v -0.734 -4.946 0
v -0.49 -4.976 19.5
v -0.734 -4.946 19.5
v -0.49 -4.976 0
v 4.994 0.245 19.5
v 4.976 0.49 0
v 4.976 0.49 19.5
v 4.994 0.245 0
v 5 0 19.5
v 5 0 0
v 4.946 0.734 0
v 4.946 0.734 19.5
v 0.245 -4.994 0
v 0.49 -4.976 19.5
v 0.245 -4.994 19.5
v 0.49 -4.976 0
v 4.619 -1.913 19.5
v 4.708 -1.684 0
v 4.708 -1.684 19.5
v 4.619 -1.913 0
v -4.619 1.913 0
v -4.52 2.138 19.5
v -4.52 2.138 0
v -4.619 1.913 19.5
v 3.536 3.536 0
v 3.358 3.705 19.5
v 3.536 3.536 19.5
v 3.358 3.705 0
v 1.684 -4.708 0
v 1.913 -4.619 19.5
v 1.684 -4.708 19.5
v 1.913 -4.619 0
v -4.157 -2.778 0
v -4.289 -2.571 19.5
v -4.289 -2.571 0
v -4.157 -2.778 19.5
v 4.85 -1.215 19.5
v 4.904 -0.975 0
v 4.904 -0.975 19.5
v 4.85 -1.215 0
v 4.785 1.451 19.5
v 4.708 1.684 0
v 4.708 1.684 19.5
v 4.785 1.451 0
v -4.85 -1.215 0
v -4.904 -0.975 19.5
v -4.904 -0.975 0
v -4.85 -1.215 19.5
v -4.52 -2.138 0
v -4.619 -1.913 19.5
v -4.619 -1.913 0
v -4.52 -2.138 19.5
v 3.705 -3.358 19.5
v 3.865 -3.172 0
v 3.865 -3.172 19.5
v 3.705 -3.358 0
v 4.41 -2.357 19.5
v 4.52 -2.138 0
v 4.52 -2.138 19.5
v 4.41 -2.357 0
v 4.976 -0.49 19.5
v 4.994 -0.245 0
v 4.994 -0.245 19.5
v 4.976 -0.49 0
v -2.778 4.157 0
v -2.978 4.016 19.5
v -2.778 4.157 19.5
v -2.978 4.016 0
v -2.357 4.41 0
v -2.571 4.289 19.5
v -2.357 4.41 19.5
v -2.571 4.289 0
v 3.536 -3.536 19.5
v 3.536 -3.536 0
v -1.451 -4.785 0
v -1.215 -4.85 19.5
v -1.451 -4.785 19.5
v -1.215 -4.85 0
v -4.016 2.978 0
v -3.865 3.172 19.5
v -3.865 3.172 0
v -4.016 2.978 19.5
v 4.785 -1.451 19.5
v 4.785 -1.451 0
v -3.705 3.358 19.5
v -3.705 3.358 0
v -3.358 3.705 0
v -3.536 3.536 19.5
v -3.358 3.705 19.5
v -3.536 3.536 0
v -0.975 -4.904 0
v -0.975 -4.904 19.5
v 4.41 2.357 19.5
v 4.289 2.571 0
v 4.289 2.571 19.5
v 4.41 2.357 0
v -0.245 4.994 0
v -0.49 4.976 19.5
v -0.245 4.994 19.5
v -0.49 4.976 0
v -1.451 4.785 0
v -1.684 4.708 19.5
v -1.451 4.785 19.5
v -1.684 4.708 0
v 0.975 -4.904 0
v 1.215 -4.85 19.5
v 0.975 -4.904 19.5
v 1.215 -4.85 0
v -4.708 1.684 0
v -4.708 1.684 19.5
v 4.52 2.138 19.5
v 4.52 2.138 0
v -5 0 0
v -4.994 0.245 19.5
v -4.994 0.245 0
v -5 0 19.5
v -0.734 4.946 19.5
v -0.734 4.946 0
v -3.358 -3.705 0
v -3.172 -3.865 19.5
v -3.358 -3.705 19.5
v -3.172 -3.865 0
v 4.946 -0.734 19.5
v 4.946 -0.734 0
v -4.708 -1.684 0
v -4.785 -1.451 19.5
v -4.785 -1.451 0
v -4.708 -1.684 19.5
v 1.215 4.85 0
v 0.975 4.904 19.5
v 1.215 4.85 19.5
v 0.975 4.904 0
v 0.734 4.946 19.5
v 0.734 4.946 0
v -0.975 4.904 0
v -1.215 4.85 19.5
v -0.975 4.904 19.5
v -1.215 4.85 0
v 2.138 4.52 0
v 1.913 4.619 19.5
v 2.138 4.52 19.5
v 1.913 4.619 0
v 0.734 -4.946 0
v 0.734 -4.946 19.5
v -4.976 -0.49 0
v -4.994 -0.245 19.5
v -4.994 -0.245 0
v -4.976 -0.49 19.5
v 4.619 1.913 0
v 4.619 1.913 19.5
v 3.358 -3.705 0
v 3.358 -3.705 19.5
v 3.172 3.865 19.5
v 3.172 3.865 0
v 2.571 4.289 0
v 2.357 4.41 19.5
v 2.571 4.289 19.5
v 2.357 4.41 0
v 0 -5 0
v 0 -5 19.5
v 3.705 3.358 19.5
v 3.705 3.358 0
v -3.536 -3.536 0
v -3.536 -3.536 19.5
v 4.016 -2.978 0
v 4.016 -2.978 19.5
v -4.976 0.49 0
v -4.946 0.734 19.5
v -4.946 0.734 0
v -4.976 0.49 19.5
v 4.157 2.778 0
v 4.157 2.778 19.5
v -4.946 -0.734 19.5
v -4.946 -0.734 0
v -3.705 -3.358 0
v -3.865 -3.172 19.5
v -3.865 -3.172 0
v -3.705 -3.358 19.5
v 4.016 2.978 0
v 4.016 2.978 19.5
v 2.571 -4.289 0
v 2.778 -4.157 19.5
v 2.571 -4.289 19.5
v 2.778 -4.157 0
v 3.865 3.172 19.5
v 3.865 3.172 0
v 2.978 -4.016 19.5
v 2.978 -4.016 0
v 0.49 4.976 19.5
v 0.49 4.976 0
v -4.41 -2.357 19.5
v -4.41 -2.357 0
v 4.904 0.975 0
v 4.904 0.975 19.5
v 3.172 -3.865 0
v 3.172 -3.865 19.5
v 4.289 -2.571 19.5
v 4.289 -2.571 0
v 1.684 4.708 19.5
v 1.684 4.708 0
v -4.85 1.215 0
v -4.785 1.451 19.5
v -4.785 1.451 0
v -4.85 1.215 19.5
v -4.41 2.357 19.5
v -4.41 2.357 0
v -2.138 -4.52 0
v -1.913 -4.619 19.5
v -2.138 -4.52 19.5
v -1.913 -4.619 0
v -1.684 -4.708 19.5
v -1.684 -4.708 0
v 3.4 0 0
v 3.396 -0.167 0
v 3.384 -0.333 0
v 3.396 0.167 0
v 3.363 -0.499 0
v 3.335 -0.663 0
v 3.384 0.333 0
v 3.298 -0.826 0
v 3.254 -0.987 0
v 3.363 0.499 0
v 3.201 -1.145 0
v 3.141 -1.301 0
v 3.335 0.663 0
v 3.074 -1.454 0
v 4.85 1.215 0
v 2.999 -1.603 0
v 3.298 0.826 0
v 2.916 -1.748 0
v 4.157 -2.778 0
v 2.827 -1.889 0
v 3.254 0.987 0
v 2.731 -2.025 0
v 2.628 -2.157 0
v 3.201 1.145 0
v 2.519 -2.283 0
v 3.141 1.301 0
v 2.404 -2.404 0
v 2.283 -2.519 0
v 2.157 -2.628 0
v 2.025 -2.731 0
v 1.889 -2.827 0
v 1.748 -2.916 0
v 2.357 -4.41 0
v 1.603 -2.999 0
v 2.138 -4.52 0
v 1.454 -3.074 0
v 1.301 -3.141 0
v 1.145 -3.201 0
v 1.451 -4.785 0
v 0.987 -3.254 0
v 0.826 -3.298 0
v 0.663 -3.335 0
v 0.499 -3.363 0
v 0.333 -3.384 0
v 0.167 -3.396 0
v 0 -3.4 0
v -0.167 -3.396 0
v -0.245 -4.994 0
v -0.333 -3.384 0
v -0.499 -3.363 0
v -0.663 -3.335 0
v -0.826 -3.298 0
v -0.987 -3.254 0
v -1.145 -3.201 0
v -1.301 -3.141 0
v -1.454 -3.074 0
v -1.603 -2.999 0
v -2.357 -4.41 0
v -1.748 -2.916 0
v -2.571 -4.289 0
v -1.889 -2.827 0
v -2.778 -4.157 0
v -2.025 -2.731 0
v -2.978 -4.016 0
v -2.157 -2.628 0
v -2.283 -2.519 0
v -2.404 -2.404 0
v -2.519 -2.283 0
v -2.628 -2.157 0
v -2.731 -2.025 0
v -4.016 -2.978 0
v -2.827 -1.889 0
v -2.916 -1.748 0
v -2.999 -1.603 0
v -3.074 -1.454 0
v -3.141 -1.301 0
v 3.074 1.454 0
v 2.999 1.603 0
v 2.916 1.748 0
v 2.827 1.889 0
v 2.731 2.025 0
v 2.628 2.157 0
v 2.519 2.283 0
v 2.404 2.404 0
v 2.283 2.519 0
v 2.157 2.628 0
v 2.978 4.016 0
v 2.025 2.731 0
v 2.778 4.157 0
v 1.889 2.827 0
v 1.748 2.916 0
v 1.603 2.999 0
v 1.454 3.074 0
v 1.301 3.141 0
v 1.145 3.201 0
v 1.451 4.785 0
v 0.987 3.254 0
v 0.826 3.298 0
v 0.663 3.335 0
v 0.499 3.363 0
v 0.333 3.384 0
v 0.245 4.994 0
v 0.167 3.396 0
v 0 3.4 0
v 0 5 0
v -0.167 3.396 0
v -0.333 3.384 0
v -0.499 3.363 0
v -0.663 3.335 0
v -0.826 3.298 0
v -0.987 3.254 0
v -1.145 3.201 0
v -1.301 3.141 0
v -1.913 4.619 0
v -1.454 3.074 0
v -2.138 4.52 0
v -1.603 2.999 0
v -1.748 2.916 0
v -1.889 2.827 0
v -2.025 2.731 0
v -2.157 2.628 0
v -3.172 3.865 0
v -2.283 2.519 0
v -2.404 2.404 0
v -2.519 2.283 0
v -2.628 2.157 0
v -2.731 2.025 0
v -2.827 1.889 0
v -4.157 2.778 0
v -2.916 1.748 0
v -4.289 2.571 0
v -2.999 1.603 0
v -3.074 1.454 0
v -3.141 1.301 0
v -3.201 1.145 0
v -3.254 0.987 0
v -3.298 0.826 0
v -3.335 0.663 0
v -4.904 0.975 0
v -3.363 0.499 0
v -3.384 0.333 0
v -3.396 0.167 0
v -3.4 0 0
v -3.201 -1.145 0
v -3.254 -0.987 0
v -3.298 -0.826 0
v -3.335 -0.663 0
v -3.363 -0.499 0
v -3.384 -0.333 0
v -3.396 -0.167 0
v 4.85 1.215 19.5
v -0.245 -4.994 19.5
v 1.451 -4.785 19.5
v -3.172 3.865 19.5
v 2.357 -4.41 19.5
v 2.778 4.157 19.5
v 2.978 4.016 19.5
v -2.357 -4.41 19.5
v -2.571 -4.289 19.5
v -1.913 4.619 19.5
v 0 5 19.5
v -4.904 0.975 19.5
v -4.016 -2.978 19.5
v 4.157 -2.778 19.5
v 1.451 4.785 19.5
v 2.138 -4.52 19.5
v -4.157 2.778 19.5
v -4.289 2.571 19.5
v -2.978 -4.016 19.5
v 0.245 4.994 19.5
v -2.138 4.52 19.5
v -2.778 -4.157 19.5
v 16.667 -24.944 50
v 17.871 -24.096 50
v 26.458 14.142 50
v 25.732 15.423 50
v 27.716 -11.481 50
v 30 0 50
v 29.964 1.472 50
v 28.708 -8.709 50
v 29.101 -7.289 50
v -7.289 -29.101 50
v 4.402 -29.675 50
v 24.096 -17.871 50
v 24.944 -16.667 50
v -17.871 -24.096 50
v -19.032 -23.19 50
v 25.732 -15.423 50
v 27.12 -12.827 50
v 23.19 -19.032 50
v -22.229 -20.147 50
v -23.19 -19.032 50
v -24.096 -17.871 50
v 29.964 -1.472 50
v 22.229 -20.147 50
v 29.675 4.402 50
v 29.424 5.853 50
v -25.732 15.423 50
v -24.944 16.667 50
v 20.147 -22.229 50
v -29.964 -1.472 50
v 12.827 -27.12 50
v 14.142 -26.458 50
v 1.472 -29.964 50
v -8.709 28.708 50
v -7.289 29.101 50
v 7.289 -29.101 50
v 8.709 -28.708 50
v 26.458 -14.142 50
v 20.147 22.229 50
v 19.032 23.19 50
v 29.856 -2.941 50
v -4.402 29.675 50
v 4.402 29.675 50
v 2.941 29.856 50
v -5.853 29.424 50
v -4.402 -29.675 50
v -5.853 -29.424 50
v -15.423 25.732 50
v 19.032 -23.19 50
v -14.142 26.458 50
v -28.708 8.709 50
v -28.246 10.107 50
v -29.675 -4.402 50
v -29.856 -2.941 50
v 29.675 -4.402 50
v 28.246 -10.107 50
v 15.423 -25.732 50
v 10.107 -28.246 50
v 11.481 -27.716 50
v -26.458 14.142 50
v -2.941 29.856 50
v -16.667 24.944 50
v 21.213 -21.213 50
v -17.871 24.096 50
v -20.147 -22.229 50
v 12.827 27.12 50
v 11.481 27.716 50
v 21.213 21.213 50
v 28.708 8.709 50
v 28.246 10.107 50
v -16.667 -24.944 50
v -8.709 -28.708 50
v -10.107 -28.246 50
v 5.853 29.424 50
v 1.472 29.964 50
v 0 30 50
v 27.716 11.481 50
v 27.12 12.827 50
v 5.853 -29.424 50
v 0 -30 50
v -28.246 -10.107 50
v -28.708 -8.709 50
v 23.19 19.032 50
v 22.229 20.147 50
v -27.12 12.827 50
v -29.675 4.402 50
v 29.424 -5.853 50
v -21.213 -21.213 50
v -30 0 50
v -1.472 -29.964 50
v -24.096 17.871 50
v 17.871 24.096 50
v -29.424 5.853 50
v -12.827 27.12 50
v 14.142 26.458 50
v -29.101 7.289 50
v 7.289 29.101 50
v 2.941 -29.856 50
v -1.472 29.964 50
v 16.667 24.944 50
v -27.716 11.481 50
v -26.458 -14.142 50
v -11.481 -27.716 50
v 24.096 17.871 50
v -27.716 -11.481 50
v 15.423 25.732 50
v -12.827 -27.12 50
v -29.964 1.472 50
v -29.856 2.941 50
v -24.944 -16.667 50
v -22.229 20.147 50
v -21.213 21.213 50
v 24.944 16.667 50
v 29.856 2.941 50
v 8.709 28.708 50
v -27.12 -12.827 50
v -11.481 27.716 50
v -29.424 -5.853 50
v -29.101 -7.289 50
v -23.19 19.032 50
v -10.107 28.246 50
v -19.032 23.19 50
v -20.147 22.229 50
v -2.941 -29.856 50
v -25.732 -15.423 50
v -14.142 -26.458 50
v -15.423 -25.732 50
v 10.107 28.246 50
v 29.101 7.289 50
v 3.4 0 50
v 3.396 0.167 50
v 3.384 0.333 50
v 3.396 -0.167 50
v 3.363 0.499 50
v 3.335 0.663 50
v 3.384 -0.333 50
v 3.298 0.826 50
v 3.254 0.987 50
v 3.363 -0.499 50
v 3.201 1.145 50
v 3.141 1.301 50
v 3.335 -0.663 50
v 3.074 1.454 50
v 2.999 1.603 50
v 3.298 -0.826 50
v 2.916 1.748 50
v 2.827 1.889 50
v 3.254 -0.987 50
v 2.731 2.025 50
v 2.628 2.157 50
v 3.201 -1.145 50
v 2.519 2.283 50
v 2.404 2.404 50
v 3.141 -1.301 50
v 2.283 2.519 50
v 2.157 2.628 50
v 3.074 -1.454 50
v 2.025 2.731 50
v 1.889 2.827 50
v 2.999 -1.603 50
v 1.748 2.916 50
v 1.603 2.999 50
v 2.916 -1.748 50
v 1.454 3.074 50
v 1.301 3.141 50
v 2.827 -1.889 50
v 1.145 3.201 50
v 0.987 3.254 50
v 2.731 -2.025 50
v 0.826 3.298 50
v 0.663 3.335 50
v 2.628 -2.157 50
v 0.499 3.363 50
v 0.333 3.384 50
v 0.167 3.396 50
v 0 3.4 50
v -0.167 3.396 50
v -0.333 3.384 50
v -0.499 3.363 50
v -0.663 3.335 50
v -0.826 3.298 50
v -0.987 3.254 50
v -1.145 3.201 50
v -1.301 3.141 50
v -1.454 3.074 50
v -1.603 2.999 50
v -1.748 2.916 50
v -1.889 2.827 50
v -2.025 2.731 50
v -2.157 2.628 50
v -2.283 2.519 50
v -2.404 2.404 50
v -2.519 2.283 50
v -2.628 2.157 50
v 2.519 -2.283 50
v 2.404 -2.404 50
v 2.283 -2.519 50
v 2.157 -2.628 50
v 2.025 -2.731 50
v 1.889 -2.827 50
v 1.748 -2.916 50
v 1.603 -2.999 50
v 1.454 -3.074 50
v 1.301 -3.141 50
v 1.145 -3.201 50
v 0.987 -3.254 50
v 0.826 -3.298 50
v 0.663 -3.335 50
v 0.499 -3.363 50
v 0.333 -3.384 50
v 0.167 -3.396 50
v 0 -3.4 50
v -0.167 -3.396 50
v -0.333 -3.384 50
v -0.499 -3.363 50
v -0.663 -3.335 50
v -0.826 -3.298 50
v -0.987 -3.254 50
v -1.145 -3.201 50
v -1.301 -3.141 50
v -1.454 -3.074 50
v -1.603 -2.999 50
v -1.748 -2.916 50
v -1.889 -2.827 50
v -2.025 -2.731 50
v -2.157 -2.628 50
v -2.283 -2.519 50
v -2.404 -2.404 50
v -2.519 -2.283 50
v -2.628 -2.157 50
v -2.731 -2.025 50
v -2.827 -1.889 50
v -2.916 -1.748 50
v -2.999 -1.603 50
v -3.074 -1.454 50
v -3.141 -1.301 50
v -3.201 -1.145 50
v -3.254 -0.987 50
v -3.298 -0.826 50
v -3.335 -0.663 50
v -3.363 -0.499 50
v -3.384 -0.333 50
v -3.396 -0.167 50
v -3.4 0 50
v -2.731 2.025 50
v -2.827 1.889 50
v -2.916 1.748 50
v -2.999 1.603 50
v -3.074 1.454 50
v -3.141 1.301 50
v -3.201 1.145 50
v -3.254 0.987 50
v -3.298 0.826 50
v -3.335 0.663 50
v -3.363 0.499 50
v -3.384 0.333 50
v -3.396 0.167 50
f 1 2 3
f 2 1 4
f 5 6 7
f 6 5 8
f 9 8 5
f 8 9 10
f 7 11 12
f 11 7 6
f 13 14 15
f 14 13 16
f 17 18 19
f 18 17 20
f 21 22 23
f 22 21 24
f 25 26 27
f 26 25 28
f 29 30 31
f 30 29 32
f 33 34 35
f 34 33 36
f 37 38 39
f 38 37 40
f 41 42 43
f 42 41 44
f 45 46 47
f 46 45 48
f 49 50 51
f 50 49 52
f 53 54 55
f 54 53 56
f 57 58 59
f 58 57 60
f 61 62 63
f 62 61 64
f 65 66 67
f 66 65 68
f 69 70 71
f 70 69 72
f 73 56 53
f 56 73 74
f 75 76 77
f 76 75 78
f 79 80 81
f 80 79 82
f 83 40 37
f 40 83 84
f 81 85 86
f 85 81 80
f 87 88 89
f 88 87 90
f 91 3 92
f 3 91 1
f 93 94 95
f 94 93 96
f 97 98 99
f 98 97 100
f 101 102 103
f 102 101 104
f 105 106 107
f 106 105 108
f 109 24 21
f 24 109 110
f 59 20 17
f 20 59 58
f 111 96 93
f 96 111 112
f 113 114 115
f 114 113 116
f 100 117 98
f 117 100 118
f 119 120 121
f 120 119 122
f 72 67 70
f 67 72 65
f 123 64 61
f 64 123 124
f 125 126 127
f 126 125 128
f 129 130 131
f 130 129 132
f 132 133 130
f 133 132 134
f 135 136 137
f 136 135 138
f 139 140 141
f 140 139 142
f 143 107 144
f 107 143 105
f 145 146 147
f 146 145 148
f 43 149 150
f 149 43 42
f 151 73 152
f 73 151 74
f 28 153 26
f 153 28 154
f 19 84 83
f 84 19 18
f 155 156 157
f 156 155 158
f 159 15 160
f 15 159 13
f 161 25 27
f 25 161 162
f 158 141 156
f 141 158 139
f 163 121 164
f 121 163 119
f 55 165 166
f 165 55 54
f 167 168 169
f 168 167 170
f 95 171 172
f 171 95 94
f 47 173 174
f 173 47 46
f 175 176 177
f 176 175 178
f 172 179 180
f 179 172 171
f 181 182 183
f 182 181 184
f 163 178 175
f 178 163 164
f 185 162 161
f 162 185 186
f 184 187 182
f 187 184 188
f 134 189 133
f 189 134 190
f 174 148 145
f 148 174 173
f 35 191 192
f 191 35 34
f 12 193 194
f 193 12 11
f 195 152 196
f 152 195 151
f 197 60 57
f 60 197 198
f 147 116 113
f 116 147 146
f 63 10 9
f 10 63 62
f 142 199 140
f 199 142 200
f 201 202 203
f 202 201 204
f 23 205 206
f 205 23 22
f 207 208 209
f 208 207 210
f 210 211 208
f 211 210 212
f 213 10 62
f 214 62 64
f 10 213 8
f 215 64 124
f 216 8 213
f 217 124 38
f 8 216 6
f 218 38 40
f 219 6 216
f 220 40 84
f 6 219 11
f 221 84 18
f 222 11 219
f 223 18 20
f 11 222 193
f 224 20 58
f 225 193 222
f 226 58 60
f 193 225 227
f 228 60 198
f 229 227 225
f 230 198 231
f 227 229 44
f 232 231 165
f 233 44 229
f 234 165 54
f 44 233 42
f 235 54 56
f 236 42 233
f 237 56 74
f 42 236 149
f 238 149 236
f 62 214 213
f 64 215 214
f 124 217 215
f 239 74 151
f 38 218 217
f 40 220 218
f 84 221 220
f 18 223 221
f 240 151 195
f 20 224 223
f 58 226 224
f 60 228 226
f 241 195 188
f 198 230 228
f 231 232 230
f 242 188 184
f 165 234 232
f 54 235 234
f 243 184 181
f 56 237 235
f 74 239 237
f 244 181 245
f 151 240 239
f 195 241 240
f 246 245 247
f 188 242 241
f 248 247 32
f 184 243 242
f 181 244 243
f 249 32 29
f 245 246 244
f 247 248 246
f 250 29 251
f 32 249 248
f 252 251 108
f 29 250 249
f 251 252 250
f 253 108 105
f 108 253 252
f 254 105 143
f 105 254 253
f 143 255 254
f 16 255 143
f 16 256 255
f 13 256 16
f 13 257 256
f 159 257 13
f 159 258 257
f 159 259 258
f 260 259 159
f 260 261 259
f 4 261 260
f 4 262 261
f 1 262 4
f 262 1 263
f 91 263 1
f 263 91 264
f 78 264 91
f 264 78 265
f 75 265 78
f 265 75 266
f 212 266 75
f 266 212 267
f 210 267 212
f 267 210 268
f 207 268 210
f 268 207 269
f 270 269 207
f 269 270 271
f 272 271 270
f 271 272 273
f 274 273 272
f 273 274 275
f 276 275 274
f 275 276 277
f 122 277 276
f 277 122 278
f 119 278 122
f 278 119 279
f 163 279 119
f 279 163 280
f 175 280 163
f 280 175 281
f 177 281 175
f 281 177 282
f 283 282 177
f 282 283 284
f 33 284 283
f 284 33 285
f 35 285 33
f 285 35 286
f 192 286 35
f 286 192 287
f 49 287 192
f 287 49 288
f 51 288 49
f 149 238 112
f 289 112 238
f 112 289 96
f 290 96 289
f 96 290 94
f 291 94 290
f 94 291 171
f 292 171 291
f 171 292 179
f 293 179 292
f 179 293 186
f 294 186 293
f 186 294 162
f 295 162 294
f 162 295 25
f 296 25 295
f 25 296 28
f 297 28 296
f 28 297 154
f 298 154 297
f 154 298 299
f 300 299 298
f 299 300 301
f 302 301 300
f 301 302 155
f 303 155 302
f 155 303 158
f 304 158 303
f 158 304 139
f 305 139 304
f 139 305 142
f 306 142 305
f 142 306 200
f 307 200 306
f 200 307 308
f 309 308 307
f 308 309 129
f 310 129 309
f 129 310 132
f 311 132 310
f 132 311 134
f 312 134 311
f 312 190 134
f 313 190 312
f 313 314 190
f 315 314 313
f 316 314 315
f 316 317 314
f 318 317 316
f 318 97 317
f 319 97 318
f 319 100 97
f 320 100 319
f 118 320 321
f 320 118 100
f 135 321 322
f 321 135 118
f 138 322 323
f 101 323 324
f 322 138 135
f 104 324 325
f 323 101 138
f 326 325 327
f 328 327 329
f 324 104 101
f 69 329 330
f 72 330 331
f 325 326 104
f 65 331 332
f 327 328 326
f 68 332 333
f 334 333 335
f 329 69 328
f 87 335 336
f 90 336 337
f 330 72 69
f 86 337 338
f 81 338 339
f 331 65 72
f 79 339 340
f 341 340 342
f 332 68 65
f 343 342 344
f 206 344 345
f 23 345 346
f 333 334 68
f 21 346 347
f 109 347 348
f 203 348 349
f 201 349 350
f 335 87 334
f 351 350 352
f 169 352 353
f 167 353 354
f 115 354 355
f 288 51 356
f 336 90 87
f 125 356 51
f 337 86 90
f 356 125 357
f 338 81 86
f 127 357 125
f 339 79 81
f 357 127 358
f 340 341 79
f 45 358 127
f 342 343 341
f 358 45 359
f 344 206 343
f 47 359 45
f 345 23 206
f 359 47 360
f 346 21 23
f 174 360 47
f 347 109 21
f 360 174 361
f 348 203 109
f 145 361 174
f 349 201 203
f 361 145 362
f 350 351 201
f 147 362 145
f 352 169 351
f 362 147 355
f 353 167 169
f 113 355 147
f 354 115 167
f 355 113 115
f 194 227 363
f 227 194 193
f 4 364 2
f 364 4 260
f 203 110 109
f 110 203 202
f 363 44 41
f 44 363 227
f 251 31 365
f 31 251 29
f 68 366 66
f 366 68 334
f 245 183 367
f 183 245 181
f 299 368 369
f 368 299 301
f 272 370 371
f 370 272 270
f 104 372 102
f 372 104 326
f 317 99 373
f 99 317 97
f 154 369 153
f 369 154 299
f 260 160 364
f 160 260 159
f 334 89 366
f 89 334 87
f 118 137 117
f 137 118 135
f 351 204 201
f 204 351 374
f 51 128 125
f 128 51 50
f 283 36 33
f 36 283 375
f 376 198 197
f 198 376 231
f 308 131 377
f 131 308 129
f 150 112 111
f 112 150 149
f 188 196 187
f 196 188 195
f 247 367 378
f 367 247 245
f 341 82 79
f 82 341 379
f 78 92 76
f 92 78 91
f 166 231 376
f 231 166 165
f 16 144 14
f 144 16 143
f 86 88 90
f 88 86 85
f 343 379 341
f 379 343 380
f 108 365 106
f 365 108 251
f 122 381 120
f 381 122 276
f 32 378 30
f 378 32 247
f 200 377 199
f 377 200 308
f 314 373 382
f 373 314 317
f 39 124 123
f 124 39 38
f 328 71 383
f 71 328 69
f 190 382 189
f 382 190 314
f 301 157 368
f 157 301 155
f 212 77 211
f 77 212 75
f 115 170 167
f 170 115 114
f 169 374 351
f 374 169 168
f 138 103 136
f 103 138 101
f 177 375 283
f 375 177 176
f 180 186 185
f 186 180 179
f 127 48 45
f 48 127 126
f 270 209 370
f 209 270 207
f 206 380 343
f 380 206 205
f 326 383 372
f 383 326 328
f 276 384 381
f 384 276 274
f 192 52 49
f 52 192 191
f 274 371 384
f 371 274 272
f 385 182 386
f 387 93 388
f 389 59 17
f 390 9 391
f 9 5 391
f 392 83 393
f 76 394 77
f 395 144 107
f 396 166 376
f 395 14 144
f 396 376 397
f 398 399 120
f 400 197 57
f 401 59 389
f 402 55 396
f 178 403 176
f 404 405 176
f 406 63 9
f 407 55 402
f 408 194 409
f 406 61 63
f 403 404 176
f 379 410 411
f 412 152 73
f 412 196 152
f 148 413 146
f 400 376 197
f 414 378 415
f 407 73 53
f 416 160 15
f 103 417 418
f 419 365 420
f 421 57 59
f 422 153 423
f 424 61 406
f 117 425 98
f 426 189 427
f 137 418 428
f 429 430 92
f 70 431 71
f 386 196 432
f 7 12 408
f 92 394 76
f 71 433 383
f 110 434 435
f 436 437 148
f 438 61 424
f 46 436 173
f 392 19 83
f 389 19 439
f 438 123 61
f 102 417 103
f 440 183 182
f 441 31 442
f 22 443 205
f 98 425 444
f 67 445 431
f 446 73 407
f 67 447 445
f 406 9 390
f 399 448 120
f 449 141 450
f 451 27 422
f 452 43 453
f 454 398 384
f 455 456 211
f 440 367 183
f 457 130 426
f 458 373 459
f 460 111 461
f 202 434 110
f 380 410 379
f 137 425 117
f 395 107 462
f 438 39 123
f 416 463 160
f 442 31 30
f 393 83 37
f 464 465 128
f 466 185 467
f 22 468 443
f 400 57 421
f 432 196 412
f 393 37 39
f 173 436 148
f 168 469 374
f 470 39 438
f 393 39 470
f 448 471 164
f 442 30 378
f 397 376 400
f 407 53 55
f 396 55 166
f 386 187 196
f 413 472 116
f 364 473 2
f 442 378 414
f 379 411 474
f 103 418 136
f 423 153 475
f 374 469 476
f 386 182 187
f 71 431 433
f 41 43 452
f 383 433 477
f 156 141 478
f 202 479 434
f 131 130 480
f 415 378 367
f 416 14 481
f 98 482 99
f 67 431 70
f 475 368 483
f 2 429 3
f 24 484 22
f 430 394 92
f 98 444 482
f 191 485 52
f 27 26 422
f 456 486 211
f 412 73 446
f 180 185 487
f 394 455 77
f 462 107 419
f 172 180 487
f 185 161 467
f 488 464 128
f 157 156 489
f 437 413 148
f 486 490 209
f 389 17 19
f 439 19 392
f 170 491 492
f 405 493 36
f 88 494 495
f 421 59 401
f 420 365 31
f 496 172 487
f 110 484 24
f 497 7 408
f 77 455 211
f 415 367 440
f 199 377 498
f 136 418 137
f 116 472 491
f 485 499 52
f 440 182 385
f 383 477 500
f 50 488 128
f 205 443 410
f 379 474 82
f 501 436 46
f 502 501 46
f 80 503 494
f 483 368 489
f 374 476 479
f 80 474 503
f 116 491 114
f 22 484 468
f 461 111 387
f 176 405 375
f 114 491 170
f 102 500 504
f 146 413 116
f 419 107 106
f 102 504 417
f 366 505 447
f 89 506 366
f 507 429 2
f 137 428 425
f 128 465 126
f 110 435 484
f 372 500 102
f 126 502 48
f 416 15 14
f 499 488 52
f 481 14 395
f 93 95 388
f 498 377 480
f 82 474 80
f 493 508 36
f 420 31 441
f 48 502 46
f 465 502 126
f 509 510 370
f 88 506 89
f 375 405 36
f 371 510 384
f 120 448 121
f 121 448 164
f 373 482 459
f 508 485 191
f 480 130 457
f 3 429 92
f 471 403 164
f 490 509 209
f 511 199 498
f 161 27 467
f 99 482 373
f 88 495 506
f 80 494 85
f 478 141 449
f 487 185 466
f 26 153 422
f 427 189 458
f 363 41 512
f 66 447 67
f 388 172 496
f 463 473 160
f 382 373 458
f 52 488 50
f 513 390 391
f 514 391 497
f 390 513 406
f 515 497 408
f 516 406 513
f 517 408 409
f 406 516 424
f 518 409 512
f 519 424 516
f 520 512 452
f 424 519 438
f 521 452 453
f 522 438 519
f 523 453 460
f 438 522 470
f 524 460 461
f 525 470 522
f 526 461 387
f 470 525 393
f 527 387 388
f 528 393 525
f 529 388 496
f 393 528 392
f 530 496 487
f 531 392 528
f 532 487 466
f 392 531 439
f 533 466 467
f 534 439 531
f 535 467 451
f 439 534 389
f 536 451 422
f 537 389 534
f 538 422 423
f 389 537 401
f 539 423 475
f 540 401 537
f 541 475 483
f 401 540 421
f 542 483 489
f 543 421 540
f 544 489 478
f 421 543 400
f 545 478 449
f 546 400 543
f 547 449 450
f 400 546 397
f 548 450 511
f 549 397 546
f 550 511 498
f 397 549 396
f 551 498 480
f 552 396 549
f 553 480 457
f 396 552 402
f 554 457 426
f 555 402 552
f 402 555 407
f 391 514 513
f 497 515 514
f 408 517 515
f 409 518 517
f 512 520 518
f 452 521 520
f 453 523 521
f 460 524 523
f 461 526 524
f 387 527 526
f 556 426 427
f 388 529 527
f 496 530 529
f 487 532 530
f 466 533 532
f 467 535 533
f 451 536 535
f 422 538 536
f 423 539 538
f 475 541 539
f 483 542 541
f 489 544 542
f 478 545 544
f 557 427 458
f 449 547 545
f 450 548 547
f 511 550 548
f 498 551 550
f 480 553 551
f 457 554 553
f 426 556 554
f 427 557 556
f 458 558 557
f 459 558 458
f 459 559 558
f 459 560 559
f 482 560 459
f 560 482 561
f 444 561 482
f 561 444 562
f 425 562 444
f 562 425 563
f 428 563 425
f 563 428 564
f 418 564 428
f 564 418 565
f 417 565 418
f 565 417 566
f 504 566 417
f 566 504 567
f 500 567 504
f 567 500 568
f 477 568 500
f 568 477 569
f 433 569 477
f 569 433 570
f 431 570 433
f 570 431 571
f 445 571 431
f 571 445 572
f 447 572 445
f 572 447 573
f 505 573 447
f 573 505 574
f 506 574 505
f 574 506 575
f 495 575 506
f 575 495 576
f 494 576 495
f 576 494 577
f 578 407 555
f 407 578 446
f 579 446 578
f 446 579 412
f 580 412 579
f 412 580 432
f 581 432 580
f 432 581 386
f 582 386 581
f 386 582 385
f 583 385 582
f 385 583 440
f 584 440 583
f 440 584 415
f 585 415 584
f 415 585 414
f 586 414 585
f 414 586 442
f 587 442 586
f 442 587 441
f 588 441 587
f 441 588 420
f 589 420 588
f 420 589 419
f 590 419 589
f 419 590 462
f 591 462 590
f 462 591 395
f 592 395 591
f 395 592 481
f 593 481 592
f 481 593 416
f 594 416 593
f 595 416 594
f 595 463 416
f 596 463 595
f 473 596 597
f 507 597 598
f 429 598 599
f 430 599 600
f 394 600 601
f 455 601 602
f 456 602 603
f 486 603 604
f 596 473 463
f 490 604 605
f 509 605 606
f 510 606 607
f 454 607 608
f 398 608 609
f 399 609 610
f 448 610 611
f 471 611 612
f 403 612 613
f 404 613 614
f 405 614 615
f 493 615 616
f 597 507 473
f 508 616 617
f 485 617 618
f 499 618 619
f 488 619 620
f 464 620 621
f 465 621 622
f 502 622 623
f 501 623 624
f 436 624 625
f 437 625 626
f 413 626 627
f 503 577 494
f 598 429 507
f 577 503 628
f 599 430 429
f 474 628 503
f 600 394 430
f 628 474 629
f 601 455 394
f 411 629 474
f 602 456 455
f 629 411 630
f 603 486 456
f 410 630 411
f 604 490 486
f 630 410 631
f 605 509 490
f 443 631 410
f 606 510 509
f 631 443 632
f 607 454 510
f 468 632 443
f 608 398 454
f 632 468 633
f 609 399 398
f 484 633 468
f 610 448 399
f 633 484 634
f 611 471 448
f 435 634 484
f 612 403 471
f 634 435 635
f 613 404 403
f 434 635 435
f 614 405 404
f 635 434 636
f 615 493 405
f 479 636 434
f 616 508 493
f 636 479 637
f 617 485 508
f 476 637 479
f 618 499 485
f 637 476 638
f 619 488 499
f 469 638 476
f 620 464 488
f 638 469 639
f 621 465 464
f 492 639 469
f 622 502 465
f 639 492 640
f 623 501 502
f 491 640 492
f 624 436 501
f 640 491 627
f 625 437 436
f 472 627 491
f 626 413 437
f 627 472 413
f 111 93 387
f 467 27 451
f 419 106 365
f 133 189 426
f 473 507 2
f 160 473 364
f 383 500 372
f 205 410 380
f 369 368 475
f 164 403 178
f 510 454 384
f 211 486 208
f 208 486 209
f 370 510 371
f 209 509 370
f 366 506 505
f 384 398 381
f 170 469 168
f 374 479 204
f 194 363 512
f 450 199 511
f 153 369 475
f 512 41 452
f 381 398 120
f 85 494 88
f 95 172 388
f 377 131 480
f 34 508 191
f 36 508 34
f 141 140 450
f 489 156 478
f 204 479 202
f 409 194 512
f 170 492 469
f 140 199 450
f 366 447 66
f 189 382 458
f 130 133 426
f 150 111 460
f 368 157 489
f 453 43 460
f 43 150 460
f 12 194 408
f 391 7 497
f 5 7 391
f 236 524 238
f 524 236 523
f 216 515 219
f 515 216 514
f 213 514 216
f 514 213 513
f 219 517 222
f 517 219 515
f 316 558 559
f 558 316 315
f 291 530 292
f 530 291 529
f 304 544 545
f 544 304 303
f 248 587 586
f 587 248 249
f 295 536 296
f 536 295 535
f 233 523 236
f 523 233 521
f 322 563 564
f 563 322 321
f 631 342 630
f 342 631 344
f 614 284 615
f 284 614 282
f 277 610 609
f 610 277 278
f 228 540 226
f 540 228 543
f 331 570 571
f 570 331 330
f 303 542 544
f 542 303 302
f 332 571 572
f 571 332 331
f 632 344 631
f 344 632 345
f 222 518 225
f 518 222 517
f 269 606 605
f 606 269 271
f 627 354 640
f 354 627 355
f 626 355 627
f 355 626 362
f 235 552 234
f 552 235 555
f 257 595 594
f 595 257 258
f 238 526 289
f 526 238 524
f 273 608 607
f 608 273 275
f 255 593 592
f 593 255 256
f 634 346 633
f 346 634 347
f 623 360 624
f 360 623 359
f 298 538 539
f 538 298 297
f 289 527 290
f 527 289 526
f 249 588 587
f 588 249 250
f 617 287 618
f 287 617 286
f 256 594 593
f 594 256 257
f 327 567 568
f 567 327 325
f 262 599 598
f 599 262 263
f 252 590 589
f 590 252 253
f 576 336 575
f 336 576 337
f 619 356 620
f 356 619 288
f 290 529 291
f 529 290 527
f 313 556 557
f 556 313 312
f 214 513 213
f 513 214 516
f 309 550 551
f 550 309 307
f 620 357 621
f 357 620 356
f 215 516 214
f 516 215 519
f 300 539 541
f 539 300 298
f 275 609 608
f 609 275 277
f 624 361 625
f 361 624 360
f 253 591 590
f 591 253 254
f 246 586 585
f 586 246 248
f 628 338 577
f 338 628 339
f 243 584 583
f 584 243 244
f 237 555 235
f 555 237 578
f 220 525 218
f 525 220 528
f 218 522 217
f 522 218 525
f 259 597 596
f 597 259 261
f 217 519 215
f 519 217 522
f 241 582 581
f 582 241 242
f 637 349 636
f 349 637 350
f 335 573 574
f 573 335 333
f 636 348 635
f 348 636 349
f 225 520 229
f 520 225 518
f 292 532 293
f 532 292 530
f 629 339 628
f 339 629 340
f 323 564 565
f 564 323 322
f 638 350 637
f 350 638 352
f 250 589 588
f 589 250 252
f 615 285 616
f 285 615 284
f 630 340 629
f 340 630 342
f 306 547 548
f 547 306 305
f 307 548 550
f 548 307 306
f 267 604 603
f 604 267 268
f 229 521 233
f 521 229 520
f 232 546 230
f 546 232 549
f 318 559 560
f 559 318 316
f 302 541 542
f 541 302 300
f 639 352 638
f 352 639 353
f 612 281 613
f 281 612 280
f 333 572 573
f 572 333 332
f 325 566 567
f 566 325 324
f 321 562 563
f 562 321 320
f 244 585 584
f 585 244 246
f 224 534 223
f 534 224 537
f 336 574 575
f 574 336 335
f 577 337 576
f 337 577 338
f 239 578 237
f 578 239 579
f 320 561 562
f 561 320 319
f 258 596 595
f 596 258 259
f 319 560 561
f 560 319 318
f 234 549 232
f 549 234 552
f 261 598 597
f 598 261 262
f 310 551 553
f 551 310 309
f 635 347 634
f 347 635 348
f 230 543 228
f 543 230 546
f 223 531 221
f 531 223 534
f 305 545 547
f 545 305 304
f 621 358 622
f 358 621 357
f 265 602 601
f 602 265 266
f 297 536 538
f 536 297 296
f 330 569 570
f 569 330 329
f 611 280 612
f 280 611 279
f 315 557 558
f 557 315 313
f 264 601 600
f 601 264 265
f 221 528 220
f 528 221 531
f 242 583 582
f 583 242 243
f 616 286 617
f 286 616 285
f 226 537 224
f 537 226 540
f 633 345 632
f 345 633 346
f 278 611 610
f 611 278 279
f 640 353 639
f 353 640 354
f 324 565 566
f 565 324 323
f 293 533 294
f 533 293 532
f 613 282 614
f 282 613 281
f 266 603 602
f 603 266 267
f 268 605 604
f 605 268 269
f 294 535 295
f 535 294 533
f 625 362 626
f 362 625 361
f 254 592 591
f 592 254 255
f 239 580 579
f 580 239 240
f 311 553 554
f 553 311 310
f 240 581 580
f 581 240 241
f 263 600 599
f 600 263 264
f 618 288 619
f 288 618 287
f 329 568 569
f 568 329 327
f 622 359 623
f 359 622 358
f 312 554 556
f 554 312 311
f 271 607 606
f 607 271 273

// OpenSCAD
// Lab funnel - printed upright with wide opening at top
// Straight spout from z = 0 to z = 20, cone from z = 20 to z = 50

// ---- Dimensions (mm) ----
spout_od      = 10;    // spout outer diameter
spout_h       = 20;    // spout height (z = 0 to 20)
cone_od_top   = 60;    // cone outer diameter at rim (z = 50)
cone_od_bot   = 10;    // cone outer diameter at base (z = 20)
total_h       = 50;    // funnel top rim height
wall          = 1.6;   // wall thickness everywhere

eps           = 0.5;   // overlap for clean boolean cuts
$fn           = 128;   // curve resolution

// ---- Derived ----
bore = spout_od - 2 * wall;   // 6.8 mm bore in spout

// ---- Model ----
difference() {
    union() {
        // Spout
        cylinder(h = spout_h, d = spout_od);
        // Cone (slightly extended into spout for a solid union)
        translate([0, 0, spout_h - eps])
            cylinder(h = total_h - spout_h + eps, d1 = cone_od_bot, d2 = cone_od_top);
    }
    // Through-bore along Z
    translate([0, 0, -eps])
        cylinder(h = total_h + 2 * eps, d = bore);
}
